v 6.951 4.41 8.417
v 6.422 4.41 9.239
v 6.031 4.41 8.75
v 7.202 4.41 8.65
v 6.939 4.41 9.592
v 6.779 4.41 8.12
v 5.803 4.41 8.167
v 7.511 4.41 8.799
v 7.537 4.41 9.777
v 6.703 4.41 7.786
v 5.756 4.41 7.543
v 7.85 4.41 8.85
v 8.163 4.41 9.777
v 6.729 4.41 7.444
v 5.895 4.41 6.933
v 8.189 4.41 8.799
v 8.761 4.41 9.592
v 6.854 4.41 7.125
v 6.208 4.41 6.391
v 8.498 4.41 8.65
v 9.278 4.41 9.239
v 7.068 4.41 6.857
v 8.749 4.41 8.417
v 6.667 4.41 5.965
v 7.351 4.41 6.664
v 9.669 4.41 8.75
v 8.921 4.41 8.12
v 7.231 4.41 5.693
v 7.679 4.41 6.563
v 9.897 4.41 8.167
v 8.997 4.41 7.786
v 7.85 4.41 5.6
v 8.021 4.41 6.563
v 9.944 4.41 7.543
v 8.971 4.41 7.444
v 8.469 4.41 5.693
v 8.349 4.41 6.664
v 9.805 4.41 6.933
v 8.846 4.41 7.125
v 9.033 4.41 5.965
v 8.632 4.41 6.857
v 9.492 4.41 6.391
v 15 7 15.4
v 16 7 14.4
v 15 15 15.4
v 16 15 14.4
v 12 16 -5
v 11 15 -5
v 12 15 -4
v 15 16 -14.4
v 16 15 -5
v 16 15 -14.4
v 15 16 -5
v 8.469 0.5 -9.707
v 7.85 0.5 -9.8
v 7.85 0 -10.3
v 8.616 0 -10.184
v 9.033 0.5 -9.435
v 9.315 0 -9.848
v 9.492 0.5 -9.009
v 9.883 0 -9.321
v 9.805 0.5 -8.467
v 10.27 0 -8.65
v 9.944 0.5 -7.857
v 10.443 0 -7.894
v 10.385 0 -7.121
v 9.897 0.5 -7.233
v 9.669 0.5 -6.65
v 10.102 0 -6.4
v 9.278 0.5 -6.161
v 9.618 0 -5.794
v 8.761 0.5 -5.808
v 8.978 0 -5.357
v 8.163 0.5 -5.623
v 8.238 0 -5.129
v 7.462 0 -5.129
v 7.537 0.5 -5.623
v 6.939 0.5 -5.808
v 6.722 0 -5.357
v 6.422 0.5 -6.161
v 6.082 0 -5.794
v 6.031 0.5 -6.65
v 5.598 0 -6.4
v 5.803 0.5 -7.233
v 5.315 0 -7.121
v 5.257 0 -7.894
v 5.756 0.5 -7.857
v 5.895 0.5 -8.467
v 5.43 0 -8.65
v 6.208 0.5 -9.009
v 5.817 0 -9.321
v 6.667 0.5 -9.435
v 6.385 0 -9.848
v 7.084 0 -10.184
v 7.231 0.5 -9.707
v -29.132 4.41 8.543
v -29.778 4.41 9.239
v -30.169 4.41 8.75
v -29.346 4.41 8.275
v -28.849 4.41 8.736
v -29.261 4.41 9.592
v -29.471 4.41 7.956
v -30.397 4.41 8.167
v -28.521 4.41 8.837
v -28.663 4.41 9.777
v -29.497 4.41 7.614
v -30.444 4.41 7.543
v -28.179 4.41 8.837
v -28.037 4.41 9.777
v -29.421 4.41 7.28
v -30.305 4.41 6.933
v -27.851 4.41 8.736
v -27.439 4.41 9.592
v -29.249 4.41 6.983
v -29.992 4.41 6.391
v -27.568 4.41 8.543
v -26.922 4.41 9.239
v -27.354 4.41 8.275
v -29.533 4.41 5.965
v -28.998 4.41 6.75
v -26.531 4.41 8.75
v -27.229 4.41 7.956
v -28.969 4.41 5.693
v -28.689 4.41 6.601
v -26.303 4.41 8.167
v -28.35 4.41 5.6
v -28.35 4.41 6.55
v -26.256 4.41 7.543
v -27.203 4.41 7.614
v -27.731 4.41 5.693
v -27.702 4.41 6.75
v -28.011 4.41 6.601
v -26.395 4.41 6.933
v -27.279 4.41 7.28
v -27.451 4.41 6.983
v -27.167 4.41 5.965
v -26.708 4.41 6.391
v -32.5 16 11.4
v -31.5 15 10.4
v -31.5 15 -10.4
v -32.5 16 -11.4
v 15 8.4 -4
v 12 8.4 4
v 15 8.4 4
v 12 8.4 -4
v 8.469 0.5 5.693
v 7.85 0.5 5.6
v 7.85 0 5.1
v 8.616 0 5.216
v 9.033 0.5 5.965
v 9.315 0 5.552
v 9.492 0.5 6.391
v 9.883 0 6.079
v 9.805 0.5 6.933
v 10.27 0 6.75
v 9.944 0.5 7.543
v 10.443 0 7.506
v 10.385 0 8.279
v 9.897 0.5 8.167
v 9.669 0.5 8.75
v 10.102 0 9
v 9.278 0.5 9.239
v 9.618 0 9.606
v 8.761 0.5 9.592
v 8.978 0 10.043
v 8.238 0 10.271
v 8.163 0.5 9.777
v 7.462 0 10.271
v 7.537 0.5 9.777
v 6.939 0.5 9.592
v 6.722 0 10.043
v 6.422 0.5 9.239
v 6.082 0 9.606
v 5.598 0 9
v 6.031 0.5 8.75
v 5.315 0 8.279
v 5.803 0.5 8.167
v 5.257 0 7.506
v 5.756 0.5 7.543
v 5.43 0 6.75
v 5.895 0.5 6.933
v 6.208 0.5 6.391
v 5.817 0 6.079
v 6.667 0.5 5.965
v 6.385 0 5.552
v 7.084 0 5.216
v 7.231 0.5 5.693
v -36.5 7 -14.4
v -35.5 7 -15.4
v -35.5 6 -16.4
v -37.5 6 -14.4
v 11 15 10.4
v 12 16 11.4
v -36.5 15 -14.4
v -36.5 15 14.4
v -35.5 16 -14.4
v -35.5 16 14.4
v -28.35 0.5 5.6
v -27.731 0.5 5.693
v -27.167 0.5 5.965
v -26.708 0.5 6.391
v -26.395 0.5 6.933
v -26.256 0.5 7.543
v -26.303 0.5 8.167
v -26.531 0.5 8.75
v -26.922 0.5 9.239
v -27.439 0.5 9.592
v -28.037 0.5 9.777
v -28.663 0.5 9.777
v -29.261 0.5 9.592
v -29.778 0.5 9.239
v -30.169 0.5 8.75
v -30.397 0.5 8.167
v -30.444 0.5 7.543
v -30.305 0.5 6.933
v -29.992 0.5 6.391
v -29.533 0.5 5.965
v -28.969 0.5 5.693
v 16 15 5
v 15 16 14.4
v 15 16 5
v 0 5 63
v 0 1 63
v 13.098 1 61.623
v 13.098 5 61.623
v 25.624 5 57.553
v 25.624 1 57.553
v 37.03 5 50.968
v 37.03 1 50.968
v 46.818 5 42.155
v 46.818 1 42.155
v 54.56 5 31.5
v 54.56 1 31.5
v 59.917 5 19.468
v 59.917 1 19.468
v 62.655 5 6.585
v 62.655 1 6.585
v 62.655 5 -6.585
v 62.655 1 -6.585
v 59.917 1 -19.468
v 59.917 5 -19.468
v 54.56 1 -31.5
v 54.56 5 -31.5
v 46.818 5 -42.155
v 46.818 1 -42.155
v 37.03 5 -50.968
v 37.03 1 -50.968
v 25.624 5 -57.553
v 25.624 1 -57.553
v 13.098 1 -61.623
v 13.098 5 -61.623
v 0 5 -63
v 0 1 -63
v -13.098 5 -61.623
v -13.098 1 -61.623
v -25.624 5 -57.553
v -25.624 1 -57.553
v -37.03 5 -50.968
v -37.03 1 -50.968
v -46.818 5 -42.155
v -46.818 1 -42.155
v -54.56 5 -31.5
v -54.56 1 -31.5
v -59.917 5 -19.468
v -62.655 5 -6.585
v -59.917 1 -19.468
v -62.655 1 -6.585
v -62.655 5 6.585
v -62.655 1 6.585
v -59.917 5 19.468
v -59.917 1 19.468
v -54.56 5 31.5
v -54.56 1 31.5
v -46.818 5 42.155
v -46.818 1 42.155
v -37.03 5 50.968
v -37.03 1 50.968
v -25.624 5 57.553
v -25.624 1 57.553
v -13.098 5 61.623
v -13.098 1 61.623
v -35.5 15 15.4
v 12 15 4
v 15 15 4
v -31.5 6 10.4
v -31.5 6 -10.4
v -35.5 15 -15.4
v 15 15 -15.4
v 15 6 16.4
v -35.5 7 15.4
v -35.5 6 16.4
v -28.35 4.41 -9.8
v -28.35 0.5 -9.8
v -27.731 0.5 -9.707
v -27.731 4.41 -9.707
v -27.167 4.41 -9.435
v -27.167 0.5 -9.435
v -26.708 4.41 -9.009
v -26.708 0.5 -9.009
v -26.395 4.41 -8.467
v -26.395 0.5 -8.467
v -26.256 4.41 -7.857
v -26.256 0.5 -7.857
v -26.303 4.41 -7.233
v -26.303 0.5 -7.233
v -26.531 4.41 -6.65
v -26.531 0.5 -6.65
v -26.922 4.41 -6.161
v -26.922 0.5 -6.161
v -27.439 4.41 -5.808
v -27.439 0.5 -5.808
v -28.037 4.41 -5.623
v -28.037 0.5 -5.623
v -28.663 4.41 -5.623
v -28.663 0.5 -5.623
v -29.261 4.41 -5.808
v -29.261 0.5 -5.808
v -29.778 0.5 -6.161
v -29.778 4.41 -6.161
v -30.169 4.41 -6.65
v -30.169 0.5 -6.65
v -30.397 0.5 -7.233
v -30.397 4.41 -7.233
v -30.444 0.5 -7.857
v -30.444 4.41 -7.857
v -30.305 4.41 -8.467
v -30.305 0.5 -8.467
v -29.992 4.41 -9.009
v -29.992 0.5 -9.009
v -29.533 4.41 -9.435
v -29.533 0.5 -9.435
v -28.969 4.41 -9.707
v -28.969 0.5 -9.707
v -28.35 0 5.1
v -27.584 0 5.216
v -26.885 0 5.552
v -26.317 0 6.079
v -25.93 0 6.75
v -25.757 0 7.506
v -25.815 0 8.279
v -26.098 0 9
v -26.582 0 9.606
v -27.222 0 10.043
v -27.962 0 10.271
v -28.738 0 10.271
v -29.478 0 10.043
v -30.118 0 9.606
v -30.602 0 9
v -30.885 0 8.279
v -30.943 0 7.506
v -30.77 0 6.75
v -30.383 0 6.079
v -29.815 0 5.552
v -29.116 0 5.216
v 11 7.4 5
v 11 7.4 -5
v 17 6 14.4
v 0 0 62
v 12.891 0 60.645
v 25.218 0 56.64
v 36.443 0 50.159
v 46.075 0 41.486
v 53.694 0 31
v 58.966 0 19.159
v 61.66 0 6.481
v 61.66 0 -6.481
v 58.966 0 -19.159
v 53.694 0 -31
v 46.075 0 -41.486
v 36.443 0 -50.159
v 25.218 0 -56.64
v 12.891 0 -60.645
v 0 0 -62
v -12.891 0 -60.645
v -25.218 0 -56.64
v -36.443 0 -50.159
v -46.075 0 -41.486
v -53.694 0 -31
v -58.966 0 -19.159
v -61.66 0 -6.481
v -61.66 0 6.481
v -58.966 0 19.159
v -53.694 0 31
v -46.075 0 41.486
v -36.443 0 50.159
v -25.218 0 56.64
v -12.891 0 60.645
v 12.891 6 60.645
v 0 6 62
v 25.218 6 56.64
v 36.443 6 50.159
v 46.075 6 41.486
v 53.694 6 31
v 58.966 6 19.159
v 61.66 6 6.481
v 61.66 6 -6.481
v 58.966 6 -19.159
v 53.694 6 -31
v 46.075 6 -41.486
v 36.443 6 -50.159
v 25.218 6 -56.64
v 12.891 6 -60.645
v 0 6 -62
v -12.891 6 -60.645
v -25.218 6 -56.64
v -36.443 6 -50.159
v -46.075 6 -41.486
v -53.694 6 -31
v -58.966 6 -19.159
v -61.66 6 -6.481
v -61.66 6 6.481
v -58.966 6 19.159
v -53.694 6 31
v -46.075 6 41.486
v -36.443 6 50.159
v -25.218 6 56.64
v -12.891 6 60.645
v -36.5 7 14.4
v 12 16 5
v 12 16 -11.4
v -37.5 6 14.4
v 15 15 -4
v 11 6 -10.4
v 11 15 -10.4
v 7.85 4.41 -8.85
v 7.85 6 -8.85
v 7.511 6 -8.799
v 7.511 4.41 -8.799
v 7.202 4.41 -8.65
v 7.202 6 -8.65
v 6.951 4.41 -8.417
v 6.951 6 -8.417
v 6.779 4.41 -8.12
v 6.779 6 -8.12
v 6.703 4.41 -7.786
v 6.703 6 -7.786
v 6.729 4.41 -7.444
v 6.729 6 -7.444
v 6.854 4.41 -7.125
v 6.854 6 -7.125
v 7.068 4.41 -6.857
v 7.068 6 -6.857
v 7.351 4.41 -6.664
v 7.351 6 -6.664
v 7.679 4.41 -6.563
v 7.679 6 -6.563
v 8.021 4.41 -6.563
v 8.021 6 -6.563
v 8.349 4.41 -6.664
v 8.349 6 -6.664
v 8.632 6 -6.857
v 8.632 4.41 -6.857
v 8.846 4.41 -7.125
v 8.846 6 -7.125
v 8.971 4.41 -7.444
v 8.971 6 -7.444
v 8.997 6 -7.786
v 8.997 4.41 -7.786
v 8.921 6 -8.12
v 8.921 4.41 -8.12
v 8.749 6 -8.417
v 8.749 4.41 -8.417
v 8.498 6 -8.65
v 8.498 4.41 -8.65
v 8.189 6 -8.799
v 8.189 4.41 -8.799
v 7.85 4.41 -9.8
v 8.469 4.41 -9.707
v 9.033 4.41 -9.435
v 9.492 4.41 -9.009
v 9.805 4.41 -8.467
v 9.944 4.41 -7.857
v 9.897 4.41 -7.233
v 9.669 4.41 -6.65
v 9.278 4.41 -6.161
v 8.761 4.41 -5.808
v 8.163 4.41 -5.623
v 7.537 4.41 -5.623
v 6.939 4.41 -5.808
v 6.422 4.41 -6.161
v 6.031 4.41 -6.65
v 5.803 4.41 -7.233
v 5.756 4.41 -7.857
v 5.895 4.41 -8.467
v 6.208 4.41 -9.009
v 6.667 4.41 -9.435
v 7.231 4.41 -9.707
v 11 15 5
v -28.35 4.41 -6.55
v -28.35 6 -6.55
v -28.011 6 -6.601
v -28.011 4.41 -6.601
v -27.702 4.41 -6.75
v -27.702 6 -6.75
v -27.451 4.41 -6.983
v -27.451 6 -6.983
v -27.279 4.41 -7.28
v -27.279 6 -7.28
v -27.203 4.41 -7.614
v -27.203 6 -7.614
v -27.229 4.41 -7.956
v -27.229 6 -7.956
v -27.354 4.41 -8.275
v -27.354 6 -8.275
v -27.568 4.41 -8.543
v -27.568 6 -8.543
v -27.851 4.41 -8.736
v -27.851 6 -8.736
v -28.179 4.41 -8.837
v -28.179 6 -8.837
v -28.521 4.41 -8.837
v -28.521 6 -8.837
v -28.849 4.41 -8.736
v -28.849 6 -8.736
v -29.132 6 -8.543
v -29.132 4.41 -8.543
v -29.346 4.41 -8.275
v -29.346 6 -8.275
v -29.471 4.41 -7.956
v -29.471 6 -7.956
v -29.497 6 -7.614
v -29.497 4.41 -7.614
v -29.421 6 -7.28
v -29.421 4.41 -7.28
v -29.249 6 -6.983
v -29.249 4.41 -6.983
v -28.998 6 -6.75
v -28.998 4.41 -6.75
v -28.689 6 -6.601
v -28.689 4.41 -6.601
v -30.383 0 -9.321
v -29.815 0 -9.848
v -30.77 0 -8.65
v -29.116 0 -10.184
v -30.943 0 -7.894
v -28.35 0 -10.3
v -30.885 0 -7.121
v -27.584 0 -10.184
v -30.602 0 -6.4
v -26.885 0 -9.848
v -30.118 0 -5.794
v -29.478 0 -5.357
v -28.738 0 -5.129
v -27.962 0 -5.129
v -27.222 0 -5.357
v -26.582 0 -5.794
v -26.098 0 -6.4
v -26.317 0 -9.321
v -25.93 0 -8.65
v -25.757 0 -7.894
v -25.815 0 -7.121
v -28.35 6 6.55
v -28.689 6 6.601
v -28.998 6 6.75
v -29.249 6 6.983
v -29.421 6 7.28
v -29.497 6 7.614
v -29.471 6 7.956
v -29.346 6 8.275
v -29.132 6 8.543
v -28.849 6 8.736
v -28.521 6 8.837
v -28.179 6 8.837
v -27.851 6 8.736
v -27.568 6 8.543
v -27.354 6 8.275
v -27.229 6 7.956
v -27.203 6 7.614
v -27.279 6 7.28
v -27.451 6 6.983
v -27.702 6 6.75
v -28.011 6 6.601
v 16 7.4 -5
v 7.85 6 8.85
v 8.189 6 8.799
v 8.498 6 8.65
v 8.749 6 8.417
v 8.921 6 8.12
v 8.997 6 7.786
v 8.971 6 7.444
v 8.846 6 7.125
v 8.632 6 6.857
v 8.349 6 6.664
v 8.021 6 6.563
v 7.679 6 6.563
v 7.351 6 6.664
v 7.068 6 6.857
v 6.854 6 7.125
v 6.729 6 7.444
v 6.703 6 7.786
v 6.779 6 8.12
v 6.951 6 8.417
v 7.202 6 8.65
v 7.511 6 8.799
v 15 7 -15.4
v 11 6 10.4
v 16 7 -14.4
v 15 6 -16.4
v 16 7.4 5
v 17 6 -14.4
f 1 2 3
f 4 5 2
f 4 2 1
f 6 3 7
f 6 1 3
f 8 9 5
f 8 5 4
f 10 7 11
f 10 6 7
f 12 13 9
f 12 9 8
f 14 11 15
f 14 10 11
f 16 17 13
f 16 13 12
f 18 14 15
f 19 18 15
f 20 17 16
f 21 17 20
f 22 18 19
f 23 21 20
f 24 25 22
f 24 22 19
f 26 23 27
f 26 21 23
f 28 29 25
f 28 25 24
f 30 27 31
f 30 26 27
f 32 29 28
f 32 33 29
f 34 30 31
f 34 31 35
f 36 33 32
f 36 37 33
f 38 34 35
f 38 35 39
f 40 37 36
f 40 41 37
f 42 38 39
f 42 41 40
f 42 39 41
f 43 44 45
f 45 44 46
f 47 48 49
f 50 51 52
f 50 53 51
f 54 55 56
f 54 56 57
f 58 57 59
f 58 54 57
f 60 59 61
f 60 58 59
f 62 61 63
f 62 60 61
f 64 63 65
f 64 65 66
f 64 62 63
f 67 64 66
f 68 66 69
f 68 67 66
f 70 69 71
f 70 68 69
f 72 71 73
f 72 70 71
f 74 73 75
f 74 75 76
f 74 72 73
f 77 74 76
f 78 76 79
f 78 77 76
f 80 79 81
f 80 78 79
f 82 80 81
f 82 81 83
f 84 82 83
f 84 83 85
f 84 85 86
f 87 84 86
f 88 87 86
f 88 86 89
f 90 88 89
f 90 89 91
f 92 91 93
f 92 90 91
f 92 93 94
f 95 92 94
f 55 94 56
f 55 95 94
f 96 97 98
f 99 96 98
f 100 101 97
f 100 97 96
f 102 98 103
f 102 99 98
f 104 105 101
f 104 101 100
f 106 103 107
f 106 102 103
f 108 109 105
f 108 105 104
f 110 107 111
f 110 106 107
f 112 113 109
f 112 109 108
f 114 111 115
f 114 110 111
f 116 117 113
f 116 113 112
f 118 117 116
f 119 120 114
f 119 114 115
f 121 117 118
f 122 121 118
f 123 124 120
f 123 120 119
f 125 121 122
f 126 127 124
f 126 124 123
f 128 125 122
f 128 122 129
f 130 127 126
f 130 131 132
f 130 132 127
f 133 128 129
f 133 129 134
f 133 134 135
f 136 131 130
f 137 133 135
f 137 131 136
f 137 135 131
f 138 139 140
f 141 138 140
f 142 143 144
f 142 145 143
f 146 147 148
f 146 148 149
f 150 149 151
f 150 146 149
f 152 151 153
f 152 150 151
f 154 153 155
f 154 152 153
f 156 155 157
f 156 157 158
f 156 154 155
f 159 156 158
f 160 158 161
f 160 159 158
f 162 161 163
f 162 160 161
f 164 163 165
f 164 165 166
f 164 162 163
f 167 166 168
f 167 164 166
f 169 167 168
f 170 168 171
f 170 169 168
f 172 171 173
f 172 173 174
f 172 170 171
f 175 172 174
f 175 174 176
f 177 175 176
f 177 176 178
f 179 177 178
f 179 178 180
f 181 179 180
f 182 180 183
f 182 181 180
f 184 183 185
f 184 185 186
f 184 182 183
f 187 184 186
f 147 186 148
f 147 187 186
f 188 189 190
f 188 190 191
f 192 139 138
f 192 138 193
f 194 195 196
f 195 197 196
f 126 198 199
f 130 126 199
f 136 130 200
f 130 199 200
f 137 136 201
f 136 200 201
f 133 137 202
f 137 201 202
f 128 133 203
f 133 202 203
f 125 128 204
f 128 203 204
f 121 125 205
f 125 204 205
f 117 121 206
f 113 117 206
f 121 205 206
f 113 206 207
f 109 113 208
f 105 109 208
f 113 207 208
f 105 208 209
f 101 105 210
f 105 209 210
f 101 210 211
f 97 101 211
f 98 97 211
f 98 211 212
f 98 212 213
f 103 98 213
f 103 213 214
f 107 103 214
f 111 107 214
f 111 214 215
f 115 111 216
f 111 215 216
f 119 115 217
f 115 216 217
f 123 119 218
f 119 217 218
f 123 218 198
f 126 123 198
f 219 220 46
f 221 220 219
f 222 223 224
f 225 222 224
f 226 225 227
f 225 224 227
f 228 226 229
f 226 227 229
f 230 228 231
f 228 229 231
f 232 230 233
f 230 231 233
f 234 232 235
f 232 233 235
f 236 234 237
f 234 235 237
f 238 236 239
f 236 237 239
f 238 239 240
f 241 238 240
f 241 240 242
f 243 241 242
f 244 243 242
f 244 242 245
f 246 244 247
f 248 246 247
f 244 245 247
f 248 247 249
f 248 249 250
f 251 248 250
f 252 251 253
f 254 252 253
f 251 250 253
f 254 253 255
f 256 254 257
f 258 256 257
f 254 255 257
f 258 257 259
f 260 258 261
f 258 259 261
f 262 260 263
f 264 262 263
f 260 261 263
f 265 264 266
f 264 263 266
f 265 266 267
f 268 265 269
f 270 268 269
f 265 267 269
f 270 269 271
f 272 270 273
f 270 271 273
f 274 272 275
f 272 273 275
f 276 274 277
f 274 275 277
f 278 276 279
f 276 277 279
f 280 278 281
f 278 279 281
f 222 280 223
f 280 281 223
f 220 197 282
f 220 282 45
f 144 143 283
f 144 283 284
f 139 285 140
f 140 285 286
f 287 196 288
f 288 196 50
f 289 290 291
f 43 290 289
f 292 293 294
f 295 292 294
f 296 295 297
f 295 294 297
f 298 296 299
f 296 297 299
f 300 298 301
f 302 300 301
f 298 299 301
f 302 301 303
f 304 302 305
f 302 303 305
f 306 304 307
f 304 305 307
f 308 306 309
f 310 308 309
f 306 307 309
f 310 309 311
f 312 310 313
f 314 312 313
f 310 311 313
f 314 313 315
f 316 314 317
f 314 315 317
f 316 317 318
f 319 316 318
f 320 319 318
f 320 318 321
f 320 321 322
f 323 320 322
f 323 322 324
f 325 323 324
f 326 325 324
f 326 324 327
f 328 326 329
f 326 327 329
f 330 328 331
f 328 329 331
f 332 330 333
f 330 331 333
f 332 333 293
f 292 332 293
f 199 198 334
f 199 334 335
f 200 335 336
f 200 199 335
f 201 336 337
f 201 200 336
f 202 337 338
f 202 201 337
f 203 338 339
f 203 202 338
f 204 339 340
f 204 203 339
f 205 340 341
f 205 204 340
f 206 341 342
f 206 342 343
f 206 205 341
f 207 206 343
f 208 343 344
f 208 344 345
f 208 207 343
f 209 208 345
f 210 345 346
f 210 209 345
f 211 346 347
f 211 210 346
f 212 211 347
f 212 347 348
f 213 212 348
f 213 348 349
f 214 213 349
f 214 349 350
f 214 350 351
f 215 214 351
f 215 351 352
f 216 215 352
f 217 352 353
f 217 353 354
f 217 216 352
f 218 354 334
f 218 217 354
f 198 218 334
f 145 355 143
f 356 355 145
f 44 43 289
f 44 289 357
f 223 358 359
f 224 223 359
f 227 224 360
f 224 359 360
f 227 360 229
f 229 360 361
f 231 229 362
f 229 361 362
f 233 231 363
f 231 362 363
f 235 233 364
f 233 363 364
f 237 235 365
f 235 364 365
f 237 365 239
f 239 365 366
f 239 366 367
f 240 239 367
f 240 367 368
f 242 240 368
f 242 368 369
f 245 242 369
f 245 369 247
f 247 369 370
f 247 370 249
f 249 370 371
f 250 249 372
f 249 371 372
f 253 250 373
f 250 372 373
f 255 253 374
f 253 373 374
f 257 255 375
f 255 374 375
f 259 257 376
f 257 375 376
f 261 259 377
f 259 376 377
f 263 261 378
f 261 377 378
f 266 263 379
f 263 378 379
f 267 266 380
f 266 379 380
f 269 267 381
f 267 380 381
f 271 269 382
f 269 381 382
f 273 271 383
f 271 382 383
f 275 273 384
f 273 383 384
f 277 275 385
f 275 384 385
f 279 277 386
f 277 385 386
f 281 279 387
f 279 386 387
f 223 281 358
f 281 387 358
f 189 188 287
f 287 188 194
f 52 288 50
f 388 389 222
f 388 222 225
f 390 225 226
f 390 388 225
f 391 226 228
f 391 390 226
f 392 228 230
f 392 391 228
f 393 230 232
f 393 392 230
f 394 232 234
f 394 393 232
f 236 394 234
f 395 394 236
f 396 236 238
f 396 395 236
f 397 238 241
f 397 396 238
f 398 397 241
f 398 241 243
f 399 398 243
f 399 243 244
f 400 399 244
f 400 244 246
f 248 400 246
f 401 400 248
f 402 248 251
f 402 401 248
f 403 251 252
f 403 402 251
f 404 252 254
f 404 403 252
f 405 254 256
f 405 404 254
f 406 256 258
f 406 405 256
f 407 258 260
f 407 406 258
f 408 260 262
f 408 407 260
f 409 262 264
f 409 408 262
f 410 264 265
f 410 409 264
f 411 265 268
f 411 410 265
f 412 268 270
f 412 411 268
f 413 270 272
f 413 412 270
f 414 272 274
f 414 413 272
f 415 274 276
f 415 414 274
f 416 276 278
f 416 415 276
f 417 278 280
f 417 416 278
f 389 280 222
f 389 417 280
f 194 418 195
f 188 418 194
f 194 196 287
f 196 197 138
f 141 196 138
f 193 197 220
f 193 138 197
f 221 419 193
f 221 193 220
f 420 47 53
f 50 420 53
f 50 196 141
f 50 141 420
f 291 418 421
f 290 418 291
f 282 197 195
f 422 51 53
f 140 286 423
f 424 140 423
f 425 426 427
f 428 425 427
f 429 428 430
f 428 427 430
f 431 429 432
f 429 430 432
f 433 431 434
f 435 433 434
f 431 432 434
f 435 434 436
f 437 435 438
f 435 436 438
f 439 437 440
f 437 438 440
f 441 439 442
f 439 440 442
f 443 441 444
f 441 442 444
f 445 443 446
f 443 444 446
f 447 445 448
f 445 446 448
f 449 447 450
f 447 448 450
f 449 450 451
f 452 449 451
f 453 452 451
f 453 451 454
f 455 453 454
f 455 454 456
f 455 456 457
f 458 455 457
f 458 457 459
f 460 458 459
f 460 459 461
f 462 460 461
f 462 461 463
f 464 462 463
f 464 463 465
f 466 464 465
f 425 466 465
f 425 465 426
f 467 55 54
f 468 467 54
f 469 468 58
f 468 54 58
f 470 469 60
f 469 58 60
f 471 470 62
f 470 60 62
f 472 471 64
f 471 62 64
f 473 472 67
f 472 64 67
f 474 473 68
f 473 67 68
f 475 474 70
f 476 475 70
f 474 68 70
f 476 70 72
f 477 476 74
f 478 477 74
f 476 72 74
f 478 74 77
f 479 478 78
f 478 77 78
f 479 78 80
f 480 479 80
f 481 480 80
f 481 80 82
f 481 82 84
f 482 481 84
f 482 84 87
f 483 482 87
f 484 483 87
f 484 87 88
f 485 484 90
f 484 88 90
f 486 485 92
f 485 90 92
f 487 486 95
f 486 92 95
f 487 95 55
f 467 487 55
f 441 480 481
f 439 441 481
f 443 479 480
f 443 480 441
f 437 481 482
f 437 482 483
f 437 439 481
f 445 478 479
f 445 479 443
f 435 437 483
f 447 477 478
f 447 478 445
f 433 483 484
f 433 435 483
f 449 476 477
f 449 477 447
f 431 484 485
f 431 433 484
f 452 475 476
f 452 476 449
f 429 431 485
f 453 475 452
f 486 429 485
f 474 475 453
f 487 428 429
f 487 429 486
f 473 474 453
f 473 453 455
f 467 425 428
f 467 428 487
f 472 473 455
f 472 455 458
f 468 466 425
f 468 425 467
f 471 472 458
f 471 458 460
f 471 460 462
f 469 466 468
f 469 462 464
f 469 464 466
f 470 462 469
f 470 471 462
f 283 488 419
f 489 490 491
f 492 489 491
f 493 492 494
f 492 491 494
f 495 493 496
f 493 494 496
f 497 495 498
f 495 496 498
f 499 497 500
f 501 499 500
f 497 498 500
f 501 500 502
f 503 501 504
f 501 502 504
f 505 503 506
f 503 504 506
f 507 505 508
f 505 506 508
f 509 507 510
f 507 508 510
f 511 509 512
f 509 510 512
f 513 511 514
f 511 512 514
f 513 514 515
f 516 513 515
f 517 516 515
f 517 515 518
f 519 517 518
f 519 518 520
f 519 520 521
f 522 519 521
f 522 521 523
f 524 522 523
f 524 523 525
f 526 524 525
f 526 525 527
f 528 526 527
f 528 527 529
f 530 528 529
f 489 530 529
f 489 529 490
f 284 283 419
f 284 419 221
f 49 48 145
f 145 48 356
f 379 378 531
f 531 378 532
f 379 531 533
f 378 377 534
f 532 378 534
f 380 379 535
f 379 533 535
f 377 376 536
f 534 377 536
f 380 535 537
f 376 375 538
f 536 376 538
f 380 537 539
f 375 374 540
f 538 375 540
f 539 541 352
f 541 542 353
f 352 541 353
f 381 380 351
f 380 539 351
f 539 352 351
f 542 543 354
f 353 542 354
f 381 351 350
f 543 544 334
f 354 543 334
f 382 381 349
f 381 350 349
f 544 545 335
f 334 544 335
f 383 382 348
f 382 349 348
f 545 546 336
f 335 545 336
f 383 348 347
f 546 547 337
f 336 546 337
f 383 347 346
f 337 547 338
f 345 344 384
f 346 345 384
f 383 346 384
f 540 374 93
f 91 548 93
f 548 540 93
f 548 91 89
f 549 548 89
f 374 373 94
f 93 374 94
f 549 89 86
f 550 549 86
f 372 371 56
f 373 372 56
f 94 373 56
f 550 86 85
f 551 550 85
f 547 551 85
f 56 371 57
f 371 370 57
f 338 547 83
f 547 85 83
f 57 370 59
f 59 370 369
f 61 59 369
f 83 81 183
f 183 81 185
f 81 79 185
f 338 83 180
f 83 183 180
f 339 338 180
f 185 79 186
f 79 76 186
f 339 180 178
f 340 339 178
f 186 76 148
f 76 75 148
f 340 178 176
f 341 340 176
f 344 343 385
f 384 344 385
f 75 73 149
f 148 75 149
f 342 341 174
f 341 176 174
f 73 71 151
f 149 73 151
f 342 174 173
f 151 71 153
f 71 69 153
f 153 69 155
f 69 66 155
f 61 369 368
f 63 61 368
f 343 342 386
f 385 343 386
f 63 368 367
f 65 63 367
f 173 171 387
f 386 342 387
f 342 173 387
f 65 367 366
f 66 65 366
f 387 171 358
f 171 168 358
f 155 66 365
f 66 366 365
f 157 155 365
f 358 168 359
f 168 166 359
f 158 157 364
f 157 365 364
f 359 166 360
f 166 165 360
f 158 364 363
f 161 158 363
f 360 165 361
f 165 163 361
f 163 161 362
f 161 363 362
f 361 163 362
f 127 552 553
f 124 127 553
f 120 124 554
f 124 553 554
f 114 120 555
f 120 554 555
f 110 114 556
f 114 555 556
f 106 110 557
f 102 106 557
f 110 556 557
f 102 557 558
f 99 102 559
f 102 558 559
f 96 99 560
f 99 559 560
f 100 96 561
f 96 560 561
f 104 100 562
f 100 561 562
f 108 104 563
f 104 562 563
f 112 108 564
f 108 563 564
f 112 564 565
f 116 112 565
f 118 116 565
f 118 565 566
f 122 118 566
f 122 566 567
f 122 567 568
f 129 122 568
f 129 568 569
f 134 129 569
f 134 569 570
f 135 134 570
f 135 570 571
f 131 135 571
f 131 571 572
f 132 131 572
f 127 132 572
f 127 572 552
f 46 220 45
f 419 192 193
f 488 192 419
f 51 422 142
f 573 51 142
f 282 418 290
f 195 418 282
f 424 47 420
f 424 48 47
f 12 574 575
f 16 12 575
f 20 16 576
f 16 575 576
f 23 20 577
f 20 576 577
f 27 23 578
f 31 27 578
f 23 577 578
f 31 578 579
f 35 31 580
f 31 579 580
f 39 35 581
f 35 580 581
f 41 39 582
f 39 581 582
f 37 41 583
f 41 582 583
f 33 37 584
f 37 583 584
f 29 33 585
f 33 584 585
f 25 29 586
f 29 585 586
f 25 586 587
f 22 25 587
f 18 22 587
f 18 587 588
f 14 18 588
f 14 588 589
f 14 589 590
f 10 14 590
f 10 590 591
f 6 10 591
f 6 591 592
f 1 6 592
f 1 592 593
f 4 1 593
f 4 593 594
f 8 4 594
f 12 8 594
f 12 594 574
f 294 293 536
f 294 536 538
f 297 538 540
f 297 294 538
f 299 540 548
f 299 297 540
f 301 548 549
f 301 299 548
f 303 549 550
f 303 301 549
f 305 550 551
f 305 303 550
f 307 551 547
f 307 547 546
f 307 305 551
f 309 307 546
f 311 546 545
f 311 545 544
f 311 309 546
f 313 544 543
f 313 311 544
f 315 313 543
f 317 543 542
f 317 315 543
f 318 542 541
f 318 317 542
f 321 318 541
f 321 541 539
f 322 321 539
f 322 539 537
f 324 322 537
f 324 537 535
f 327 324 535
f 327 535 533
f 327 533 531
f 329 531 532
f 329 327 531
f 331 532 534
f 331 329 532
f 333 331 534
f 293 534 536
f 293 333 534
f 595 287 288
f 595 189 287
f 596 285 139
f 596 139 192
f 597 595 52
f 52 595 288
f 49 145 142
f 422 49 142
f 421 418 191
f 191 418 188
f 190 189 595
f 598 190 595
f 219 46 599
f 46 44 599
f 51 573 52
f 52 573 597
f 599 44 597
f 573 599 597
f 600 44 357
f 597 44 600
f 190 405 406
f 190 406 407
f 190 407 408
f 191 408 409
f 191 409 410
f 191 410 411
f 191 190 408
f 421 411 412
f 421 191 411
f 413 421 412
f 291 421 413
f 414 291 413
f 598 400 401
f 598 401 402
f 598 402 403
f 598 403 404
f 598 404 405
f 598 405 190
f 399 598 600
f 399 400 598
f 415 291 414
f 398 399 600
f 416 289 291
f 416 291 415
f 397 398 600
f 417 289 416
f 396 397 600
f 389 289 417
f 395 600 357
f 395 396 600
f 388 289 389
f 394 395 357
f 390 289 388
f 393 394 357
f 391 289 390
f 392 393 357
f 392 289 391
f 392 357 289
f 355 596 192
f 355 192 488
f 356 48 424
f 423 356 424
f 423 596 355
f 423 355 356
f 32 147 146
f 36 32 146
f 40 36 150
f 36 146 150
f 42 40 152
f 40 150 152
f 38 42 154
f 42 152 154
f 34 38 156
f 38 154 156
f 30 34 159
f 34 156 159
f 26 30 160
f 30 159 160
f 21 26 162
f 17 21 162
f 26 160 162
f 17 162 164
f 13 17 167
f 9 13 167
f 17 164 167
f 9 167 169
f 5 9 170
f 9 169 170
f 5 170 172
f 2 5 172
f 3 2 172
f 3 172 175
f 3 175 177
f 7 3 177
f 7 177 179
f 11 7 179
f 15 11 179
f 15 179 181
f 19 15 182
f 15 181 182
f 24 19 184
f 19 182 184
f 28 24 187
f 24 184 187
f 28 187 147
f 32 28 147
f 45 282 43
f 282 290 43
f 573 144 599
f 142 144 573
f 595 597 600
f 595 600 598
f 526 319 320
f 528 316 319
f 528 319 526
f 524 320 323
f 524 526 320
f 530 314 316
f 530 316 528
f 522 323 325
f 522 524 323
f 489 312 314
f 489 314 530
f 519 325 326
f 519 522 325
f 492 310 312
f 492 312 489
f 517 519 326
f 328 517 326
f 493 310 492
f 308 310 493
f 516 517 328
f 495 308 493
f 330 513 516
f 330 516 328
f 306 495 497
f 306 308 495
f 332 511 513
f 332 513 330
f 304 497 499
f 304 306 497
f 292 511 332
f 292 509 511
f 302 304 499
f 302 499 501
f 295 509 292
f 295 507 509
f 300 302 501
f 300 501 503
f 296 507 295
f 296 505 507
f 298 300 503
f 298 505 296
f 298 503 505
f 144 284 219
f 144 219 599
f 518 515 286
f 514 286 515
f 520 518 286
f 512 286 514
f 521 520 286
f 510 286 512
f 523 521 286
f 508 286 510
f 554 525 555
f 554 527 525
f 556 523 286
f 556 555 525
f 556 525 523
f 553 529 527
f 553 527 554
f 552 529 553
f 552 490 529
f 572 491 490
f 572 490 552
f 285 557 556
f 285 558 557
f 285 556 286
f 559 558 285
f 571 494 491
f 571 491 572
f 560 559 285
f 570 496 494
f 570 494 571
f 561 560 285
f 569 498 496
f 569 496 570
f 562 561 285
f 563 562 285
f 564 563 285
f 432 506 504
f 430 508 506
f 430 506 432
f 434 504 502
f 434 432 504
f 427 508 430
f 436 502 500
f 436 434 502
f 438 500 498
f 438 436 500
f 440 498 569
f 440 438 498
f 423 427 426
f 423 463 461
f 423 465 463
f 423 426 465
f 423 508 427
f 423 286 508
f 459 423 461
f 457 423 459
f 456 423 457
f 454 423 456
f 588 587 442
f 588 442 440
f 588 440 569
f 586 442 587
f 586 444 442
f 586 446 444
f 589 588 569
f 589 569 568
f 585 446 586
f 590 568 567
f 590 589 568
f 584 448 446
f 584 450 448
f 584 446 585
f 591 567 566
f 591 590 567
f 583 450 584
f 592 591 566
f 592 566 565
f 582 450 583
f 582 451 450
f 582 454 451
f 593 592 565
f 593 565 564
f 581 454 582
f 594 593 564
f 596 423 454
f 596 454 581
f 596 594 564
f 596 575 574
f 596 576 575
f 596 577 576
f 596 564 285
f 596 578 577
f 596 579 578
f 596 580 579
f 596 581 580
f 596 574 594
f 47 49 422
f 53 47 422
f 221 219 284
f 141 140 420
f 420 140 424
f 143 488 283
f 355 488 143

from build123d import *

# Parameters (mm, degrees)
SKETCH1_R           = 63
BOSS_EXTRUDE1_DEPTH = 6
CHAMFER2_SIZE       = 1
SKETCH4_W           = 52.5
SKETCH4_H           = 30.8
SKETCH4_W_2         = 42.5
SKETCH4_H_2         = 20.8
BOSS_EXTRUDE2_DEPTH = 10
SKETCH5_W           = 5
SKETCH5_H           = 8
CUT_EXTRUDE1_DEPTH  = 7.6
SKETCH6_R           = 1.15
CUT_EXTRUDE2_DEPTH  = 90.654893899
SKETCH7_R           = 2.1
CUT_EXTRUDE3_DEPTH  = 4.41
CHAMFER3_SIZE       = 1
CHAMFER4_SIZE       = 0.5


with BuildPart() as part:
    # Sketch1 → Boss-Extrude1 (new body)
    with BuildSketch(Plane(origin=(0, 0, 0), x_dir=(1, 0, 0), z_dir=(0, 1, 0))):
        with Locations(Location((0, 0, 0), (0, 0, 270))):
            Circle(SKETCH1_R)
    extrude(amount=BOSS_EXTRUDE1_DEPTH)

    # Chamfer2
    chamfer2_edges = [part.edges().sort_by_distance(p)[0] for p in [
        (0, 0, -63),
        (0, 6, -63),
    ]]
    chamfer(chamfer2_edges, length=CHAMFER2_SIZE)

    # Sketch4 → Boss-Extrude2 (add)
    with BuildSketch(Plane(origin=(0, 6, 0), x_dir=(1, 0, 0), z_dir=(0, 1, 0))):
        with Locations((-10.25, 0)):
            Rectangle(SKETCH4_W, SKETCH4_H)
        with Locations((-10.25, 0)):
            Rectangle(SKETCH4_W_2, SKETCH4_H_2, mode=Mode.SUBTRACT)
    extrude(amount=BOSS_EXTRUDE2_DEPTH)

    # Sketch5 → Cut-Extrude1 (cut)
    with BuildSketch(Plane(origin=(0, 16, 0), x_dir=(1, 0, 0), z_dir=(0, 1, 0))):
        with Locations((13.5, 0)):
            Rectangle(SKETCH5_W, SKETCH5_H)
    extrude(amount=-CUT_EXTRUDE1_DEPTH, mode=Mode.SUBTRACT)

    # Sketch6 → Cut-Extrude2 (cut, through all)
    with BuildSketch(Plane(origin=(0, 6, 0), x_dir=(1, 0, 0), z_dir=(0, 1, 0))):
        with Locations(Location((-28.35, 7.7, 0), (0, 0, 270))):
            Circle(SKETCH6_R)
        with Locations(Location((7.85, 7.7, 0), (0, 0, 90))):
            Circle(SKETCH6_R)
        with Locations(Location((7.85, -7.7, 0), (0, 0, 270))):
            Circle(SKETCH6_R)
        with Locations(Location((-28.35, -7.7, 0), (0, 0, 90))):
            Circle(SKETCH6_R)
    extrude(amount=-CUT_EXTRUDE2_DEPTH, mode=Mode.SUBTRACT)

    # Sketch7 → Cut-Extrude3 (cut)
    with BuildSketch(Plane.XZ):
        with Locations(Location((-28.35, 7.7, 0), (0, 0, 270))):
            Circle(SKETCH7_R)
        with Locations(Location((7.85, 7.7, 0), (0, 0, 270))):
            Circle(SKETCH7_R)
        with Locations(Location((-28.35, -7.7, 0), (0, 0, 270))):
            Circle(SKETCH7_R)
        with Locations(Location((7.85, -7.7, 0), (0, 0, 270))):
            Circle(SKETCH7_R)
    extrude(amount=-CUT_EXTRUDE3_DEPTH, mode=Mode.SUBTRACT)

    # Chamfer3
    chamfer3_edges = [part.edges().sort_by_distance(p)[0] for p in [
        (16, 16, 9.7),
        (-10.25, 16, -15.4),
        (-36.5, 16, 0),
        (-10.25, 16, 15.4),
        (16, 6, 0),
        (16, 11, 15.4),
        (-10.25, 6, -15.4),
        (16, 11, -15.4),
        (-36.5, 6, 0),
        (-36.5, 11, -15.4),
        (-10.25, 6, 15.4),
        (-36.5, 11, 15.4),
        (11, 16, 7.2),
        (-10.25, 16, -10.4),
        (-31.5, 16, 0),
        (-10.25, 16, 10.4),
        (11, 16, -7.2),
        (16, 16, -9.7),
        (16, 8.4, 0),
        (16, 12.2, -4),
        (16, 12.2, 4),
        (11, 8.4, 0),
        (11, 12.2, 4),
        (11, 12.2, -4),
        (13.5, 16, -4),
        (13.5, 16, 4),
    ]]
    chamfer(chamfer3_edges, length=CHAMFER3_SIZE)

    # Chamfer4
    chamfer4_edges = [part.edges().sort_by_distance(p)[0] for p in [
        (7.85, 0, 9.8),
        (-28.35, 0, -5.6),
        (7.85, 0, -5.6),
        (-28.35, 0, 9.8),
    ]]
    chamfer(chamfer4_edges, length=CHAMFER4_SIZE)


solid = part.part
